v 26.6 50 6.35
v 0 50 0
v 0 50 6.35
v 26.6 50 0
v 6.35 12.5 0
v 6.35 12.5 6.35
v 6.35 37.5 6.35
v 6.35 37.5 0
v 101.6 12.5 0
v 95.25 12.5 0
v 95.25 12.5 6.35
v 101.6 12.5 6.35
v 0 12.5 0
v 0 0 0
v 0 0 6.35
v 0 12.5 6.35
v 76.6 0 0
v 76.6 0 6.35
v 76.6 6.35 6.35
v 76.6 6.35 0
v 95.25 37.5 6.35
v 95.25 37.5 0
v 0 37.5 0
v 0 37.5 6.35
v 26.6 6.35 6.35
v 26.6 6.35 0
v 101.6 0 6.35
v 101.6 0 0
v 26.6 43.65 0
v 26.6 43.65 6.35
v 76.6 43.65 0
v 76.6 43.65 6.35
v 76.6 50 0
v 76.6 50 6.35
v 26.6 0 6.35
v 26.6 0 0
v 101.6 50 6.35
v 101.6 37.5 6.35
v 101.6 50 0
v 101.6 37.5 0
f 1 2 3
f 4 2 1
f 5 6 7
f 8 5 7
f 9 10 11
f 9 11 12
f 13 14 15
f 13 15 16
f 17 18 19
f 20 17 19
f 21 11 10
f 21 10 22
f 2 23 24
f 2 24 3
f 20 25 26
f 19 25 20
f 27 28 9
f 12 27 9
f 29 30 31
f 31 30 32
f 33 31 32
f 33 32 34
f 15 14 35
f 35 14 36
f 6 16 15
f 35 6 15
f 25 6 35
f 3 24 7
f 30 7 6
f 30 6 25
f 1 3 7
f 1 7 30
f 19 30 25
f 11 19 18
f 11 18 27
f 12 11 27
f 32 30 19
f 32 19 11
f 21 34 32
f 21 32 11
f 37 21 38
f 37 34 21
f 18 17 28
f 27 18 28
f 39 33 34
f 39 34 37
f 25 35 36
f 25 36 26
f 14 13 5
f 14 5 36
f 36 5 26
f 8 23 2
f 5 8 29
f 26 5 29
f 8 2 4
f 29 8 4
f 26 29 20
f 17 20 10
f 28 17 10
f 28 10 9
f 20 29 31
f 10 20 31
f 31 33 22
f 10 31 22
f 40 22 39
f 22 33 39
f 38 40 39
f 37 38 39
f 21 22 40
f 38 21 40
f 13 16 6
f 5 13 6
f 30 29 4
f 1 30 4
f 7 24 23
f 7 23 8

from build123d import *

# Parameters (mm, degrees)
SKETCH1_W           = 101.6
SKETCH1_H           = 50
BOSS_EXTRUDE1_DEPTH = 6.35
SKETCH3_W           = 6.35
SKETCH3_H           = 25
CUT_EXTRUDE2_DEPTH  = 7.35
SKETCH4_W           = 6.35
SKETCH4_H           = 25
SKETCH4_W_2         = 50
SKETCH4_H_2         = 6.35
CUT_EXTRUDE3_DEPTH  = 7.35


with BuildPart() as part:
    # Sketch1 → Boss-Extrude1 (new body)
    with BuildSketch(Plane.XY):
        with Locations((50.8, 25)):
            Rectangle(SKETCH1_W, SKETCH1_H)
    extrude(amount=BOSS_EXTRUDE1_DEPTH)

    # Sketch3 → Cut-Extrude2 (cut, through all)
    with BuildSketch(Plane.XY.offset(6.35)):
        with Locations((3.175, 25)):
            Rectangle(SKETCH3_W, SKETCH3_H)
    extrude(amount=-CUT_EXTRUDE2_DEPTH, mode=Mode.SUBTRACT)

    # Sketch4 → Cut-Extrude3 (cut, through all)
    with BuildSketch(Plane.XY.offset(6.35)):
        with Locations((98.425, 25)):
            Rectangle(SKETCH4_W, SKETCH4_H)
        with Locations((51.6, 46.825)):
            Rectangle(SKETCH4_W_2, SKETCH4_H_2)
        with Locations((51.6, 3.175)):
            Rectangle(SKETCH4_W_2, SKETCH4_H_2)
    extrude(amount=-CUT_EXTRUDE3_DEPTH, mode=Mode.SUBTRACT)


solid = part.part
